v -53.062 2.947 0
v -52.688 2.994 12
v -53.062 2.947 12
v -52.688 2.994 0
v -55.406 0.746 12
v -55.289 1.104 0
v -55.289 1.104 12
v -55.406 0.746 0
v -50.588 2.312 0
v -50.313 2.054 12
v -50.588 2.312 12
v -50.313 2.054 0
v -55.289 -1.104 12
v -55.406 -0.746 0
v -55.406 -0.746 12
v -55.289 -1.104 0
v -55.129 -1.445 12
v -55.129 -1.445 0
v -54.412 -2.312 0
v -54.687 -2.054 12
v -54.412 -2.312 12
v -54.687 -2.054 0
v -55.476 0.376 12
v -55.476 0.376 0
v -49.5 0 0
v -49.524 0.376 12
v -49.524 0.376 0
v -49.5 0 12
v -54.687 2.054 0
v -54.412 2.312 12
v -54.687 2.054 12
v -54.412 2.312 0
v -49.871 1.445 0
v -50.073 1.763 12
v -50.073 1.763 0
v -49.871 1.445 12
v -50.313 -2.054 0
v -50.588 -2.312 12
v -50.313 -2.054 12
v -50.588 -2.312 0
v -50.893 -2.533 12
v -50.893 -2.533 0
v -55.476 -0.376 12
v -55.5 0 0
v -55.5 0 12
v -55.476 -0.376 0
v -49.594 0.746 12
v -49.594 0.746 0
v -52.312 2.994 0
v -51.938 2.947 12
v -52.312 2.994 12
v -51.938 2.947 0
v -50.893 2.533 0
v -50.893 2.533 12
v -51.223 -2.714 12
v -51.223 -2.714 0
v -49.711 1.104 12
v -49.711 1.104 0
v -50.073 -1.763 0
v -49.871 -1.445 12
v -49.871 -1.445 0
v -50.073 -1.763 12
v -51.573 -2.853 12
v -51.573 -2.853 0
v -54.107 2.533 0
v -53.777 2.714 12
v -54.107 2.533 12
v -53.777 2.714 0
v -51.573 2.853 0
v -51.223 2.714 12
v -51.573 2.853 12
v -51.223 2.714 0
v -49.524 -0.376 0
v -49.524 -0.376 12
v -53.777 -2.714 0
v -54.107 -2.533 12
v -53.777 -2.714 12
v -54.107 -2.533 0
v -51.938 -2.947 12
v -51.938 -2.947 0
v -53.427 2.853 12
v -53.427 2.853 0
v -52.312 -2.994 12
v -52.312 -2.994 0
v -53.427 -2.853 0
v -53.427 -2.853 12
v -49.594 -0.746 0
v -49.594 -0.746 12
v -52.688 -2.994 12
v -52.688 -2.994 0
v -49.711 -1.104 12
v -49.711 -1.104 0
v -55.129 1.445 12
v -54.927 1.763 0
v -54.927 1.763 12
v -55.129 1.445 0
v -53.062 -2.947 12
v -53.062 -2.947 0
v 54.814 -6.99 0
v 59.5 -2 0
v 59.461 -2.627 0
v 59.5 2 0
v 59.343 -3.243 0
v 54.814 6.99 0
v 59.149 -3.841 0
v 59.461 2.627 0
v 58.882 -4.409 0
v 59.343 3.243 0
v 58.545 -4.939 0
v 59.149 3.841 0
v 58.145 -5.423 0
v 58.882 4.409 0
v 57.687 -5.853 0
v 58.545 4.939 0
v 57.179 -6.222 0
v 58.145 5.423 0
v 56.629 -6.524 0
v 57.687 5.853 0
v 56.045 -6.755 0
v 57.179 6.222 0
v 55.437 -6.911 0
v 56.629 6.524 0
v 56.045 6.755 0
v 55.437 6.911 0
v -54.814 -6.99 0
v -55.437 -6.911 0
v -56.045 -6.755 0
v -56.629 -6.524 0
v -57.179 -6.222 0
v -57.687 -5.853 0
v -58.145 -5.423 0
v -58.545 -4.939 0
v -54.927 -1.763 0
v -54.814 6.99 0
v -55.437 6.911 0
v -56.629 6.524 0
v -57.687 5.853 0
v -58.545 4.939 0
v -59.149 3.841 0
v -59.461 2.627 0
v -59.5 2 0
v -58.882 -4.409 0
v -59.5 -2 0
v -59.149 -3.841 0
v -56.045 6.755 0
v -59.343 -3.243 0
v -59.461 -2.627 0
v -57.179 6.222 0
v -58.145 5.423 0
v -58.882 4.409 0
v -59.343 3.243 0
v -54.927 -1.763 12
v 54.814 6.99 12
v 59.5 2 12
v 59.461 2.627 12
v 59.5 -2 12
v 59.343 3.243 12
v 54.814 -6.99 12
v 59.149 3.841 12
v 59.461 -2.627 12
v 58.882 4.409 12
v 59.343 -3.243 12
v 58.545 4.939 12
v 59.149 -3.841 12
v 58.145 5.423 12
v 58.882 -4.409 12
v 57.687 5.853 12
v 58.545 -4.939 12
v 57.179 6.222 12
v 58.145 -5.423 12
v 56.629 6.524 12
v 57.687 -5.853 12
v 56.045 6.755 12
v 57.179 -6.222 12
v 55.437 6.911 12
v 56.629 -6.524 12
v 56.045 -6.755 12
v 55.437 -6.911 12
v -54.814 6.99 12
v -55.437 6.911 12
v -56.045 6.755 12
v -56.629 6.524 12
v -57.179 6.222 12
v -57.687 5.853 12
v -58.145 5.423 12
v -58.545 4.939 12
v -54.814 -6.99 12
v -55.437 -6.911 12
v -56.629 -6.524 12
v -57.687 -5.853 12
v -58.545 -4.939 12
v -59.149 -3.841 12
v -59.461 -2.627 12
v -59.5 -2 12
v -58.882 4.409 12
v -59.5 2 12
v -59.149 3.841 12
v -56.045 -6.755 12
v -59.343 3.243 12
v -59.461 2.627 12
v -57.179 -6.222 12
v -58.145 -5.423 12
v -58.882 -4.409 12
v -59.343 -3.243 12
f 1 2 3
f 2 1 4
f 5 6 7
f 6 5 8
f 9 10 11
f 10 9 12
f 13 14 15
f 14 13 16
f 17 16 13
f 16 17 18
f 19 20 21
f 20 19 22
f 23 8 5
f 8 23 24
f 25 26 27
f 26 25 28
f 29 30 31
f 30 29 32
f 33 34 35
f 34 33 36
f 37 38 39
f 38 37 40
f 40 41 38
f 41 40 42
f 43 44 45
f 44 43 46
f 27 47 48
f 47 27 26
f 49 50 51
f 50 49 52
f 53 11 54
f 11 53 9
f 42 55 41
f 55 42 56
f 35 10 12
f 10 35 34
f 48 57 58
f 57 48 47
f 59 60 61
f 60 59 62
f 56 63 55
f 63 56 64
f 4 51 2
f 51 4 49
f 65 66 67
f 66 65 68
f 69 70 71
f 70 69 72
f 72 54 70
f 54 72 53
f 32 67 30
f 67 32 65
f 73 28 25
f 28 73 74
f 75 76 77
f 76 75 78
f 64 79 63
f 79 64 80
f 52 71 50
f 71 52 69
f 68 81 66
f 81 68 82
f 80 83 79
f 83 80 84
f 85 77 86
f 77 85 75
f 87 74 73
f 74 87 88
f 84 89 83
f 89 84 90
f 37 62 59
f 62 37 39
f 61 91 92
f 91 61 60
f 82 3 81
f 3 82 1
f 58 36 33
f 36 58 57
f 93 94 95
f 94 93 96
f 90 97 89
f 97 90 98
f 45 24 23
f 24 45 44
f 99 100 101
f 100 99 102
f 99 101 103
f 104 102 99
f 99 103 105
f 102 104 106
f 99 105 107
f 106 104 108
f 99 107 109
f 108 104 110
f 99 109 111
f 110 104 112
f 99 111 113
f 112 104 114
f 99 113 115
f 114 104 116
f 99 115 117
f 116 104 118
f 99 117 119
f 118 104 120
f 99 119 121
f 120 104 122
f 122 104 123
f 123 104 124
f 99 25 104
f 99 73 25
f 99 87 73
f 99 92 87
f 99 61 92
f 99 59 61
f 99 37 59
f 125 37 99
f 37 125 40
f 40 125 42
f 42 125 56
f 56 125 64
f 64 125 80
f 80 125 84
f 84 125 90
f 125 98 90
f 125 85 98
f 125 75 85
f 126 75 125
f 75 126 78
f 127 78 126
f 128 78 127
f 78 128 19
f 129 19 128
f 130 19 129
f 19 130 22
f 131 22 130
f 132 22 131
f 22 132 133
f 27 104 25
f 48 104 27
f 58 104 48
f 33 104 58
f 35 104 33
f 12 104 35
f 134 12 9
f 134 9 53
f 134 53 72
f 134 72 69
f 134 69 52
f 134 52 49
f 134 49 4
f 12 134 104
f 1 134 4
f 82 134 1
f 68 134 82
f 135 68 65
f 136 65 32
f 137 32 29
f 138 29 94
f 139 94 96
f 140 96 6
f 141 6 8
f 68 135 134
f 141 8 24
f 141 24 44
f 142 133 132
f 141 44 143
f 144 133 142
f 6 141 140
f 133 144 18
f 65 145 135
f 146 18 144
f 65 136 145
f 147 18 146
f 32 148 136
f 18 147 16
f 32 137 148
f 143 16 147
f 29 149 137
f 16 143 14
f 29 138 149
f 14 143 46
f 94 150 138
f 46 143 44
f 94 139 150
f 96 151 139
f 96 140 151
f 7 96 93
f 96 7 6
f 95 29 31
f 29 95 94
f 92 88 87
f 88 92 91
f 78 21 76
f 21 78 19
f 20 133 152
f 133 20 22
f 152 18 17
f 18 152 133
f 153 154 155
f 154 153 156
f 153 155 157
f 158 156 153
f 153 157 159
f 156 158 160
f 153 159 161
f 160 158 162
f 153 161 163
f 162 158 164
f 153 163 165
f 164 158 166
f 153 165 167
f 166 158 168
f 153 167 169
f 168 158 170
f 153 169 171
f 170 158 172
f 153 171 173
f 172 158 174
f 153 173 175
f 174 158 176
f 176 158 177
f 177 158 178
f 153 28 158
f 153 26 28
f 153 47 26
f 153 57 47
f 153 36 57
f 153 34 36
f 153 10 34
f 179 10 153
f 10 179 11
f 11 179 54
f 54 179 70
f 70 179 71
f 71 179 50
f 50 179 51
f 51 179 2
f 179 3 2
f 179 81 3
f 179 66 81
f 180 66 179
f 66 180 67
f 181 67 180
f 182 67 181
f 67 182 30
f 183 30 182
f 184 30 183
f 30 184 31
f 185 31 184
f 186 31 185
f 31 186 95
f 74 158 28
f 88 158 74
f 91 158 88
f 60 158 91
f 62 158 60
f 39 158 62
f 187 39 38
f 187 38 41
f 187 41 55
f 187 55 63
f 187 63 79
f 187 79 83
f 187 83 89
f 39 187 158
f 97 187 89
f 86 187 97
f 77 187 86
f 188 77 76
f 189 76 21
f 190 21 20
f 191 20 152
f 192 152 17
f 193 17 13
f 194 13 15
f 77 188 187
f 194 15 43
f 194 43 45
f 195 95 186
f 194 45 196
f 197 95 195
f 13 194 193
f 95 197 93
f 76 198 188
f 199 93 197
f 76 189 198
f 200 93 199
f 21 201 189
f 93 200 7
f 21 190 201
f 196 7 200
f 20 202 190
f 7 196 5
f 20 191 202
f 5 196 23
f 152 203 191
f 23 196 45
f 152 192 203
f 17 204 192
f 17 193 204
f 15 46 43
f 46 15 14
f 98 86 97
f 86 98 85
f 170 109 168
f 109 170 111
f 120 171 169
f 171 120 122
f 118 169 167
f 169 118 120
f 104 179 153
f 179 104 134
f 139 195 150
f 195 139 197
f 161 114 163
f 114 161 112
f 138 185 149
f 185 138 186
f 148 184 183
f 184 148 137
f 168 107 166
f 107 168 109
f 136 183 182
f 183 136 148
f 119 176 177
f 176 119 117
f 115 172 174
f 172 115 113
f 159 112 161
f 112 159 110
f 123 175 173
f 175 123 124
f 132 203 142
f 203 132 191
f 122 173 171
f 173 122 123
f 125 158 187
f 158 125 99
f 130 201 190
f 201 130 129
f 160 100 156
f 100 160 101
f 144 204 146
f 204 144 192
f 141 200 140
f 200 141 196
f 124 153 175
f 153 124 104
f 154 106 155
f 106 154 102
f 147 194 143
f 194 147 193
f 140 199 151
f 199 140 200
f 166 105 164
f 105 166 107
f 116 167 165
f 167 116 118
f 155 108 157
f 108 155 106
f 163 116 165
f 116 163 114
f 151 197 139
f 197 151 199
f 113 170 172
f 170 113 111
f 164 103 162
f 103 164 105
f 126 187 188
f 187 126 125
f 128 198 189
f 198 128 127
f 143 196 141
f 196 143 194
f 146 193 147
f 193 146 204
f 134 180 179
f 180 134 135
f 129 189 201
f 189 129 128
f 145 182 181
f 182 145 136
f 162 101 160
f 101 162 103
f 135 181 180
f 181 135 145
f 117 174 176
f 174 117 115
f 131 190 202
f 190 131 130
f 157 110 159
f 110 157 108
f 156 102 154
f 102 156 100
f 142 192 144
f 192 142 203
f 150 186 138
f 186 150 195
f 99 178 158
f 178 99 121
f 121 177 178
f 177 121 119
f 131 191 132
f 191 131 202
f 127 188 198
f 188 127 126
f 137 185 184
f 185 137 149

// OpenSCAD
$fn = 50;


difference() {
	union() {
		hull() {
			translate(v = [-54.5000000000, 2.0000000000, 0]) {
				cylinder(h = 12, r = 5);
			}
			translate(v = [54.5000000000, 2.0000000000, 0]) {
				cylinder(h = 12, r = 5);
			}
			translate(v = [-54.5000000000, -2.0000000000, 0]) {
				cylinder(h = 12, r = 5);
			}
			translate(v = [54.5000000000, -2.0000000000, 0]) {
				cylinder(h = 12, r = 5);
			}
		}
	}
	union() {
		translate(v = [-52.5000000000, 0.0000000000, 0]) {
			cylinder(h = 12, r = 3.0000000000);
		}
		translate(v = [-52.5000000000, 0.0000000000, 0]) {
			cylinder(h = 12, r = 1.5000000000);
		}
		translate(v = [-52.5000000000, 0.0000000000, 0]) {
			cylinder(h = 12, r = 1.5000000000);
		}
		translate(v = [-52.5000000000, 0.0000000000, 0]) {
			cylinder(h = 12, r = 1.5000000000);
		}
	}
}
